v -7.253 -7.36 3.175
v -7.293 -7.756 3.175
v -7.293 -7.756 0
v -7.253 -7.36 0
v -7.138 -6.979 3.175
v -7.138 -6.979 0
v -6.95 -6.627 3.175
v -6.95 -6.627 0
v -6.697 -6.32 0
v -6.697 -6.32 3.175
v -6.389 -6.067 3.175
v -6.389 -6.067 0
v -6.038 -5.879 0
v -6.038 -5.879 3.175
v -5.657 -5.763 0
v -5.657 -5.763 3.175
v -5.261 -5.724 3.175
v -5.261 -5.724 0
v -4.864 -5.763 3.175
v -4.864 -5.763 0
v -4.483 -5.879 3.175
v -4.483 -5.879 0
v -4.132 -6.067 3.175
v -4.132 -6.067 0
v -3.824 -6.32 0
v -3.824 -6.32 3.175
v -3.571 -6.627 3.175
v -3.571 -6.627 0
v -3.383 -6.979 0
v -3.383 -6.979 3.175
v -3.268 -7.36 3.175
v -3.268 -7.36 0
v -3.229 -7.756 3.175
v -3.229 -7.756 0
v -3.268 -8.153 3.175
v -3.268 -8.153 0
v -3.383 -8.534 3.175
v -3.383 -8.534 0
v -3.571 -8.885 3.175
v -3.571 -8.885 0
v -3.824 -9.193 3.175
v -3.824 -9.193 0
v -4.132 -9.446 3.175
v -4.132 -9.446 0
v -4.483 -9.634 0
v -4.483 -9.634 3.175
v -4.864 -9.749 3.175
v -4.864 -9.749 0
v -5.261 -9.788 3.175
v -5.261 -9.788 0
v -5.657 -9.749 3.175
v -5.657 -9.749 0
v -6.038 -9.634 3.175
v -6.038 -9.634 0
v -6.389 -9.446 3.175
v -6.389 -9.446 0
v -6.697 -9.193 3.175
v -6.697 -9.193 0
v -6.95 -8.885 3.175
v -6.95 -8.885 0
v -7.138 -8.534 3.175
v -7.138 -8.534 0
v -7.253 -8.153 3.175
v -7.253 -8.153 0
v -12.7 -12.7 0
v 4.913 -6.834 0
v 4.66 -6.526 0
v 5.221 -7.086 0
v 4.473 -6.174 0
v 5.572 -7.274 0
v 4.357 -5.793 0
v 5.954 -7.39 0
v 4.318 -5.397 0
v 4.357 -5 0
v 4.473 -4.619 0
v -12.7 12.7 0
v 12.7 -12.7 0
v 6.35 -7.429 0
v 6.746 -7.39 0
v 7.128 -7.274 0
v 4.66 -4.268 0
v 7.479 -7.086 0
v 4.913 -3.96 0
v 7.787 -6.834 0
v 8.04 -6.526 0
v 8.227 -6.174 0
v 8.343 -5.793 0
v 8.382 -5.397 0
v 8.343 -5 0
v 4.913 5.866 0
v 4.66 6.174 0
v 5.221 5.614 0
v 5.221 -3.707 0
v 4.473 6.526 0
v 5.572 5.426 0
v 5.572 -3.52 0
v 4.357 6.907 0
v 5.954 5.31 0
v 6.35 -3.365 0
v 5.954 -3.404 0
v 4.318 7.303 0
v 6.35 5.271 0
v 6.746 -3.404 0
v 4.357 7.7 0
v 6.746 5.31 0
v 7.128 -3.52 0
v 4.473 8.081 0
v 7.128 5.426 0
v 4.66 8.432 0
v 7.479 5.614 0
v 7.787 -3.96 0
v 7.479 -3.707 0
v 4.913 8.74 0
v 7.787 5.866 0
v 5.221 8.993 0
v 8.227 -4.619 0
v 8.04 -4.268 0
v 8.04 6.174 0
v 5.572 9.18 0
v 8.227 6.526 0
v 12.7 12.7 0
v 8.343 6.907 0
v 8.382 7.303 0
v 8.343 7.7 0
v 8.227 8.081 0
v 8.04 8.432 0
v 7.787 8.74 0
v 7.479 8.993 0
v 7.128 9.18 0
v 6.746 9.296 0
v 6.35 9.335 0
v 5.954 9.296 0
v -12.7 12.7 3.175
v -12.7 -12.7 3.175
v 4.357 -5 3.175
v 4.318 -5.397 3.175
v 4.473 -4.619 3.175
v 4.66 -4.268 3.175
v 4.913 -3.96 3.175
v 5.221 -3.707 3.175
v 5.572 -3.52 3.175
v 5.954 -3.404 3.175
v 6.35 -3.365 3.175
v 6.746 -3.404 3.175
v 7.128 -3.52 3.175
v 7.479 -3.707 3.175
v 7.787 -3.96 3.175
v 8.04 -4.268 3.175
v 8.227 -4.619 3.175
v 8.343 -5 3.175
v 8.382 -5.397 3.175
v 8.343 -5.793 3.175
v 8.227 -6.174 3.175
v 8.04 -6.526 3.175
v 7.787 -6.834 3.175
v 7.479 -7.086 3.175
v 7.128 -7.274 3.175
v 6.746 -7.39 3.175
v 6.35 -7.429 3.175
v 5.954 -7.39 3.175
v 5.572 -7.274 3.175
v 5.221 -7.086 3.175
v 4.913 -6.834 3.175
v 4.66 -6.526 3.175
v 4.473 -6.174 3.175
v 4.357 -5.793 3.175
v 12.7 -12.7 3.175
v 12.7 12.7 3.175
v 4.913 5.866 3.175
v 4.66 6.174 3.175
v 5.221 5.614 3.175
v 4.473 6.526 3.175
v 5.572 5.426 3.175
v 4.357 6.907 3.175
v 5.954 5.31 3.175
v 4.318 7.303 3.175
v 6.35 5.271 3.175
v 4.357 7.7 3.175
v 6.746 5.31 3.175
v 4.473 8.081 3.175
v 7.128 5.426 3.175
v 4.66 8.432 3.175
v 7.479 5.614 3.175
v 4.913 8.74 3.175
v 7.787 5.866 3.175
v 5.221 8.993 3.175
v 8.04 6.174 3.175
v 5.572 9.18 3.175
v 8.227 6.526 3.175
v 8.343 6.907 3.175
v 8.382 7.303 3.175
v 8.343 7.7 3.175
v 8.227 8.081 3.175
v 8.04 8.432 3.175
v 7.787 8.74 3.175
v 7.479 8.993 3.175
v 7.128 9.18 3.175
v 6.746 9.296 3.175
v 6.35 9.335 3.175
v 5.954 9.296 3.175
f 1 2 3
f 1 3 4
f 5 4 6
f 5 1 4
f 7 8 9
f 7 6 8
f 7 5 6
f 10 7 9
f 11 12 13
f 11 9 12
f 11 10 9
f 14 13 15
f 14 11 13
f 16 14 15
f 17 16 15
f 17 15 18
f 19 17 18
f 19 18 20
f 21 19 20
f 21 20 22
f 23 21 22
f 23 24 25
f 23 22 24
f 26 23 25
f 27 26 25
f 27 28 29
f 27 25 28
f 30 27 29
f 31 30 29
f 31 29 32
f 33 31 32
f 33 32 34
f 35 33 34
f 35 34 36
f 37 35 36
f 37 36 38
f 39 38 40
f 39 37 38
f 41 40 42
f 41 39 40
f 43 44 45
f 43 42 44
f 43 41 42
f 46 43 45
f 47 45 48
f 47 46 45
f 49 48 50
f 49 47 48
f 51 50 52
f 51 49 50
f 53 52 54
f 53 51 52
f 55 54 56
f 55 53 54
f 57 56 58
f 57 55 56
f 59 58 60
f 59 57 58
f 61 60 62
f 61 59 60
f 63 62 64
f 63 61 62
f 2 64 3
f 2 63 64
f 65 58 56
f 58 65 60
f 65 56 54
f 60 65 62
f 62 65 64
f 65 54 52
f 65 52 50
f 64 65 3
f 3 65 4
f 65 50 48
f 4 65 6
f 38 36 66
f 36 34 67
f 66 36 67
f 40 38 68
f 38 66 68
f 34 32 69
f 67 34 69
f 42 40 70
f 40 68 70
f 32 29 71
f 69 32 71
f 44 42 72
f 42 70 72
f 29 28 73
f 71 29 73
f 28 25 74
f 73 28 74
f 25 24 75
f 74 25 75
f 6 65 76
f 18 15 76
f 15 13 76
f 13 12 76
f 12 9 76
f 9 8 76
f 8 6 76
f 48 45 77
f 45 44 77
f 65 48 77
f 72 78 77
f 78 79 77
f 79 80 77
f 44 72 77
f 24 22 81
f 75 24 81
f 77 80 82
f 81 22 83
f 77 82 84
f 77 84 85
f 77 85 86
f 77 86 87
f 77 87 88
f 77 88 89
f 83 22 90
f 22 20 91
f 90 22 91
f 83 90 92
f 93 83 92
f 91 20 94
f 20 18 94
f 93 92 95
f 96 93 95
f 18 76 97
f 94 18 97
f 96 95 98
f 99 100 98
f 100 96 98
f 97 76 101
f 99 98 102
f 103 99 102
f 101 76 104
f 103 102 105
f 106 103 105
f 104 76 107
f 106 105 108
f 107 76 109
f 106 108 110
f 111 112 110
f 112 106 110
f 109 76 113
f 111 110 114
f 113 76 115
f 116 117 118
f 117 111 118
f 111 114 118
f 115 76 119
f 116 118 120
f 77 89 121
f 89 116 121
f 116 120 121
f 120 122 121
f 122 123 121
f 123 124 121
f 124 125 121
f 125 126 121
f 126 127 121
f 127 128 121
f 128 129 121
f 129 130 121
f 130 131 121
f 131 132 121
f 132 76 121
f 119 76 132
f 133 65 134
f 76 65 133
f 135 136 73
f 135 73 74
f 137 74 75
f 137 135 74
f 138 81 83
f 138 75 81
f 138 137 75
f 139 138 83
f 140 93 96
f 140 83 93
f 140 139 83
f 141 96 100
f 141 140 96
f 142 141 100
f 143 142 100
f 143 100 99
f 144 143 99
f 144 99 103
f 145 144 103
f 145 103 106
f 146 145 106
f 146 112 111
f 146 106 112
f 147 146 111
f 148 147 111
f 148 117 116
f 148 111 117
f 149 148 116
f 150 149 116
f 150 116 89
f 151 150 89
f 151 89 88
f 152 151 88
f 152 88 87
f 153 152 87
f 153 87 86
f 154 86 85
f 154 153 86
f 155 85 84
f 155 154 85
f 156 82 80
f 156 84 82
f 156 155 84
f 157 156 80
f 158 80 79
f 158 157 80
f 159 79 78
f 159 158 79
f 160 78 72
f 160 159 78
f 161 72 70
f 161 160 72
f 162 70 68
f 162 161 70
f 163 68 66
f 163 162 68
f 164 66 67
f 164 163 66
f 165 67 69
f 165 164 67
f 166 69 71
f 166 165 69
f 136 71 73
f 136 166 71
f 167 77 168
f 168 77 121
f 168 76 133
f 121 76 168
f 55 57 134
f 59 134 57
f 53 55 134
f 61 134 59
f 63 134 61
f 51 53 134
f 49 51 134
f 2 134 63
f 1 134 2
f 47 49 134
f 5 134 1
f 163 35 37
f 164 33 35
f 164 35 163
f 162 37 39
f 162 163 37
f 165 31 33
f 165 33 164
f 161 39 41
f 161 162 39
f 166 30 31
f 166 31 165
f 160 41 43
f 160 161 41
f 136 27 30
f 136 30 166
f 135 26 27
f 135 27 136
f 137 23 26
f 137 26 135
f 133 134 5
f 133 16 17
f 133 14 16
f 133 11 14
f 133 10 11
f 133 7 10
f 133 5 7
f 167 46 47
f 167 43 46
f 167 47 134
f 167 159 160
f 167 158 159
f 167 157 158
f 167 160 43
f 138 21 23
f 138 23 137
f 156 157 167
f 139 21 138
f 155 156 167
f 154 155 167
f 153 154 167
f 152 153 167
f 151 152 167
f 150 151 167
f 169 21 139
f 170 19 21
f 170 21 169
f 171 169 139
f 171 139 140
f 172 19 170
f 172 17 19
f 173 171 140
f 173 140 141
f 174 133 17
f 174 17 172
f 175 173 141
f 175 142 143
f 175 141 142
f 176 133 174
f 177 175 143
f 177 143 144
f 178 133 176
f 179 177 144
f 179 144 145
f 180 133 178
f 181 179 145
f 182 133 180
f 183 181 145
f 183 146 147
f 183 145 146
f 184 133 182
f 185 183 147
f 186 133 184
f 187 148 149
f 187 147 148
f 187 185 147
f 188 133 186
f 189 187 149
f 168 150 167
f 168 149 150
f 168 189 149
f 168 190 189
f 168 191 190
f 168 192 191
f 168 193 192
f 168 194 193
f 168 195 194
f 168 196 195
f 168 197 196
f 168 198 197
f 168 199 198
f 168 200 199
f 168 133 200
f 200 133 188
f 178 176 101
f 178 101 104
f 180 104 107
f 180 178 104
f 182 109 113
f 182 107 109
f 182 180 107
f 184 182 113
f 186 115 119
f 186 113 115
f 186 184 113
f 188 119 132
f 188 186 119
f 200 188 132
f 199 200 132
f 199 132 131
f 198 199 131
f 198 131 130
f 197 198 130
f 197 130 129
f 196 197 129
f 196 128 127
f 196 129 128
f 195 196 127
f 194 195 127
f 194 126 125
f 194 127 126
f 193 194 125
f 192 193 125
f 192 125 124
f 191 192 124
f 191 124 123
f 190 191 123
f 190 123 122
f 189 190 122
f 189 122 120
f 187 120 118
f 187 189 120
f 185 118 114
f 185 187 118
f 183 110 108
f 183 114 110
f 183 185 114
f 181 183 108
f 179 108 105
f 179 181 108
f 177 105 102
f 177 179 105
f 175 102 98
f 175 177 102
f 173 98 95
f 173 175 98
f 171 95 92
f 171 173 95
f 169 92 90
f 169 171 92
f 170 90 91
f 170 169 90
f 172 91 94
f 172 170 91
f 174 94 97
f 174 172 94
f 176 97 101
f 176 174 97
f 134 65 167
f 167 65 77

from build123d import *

# Parameters (mm, degrees)
SKETCH1_W               = 25.4
SKETCH1_H               = 25.4
BOSS_EXTRUDE1_DEPTH     = 3.175
CUT_EXTRUDE1_DEPTH      = 19.238986403
CUT_EXTRUDE1_DEPTH_BACK = 19.238986403
SKETCH2_R               = 2.032


with BuildPart() as part:
    # Sketch1 → Boss-Extrude1 (new body)
    with BuildSketch(Plane.XY):
        Rectangle(SKETCH1_W, SKETCH1_H)
    extrude(amount=BOSS_EXTRUDE1_DEPTH)

    # Sketch2 → Cut-Extrude1 (cut, two sides: drawn at the far end of the back side and taken through both)
    with BuildSketch(Plane(origin=(0, 0, 0), x_dir=(-1, 0, 0), z_dir=(0, 0, -1)).offset(-CUT_EXTRUDE1_DEPTH_BACK)):
        with Locations((5.260512242, -7.756353865)):
            Circle(SKETCH2_R)
        with Locations((-6.35, -5.396866107)):
            Circle(SKETCH2_R)
        with Locations((-6.35, 7.303133893)):
            Circle(SKETCH2_R)
    extrude(amount=CUT_EXTRUDE1_DEPTH + CUT_EXTRUDE1_DEPTH_BACK, mode=Mode.SUBTRACT)


solid = part.part
